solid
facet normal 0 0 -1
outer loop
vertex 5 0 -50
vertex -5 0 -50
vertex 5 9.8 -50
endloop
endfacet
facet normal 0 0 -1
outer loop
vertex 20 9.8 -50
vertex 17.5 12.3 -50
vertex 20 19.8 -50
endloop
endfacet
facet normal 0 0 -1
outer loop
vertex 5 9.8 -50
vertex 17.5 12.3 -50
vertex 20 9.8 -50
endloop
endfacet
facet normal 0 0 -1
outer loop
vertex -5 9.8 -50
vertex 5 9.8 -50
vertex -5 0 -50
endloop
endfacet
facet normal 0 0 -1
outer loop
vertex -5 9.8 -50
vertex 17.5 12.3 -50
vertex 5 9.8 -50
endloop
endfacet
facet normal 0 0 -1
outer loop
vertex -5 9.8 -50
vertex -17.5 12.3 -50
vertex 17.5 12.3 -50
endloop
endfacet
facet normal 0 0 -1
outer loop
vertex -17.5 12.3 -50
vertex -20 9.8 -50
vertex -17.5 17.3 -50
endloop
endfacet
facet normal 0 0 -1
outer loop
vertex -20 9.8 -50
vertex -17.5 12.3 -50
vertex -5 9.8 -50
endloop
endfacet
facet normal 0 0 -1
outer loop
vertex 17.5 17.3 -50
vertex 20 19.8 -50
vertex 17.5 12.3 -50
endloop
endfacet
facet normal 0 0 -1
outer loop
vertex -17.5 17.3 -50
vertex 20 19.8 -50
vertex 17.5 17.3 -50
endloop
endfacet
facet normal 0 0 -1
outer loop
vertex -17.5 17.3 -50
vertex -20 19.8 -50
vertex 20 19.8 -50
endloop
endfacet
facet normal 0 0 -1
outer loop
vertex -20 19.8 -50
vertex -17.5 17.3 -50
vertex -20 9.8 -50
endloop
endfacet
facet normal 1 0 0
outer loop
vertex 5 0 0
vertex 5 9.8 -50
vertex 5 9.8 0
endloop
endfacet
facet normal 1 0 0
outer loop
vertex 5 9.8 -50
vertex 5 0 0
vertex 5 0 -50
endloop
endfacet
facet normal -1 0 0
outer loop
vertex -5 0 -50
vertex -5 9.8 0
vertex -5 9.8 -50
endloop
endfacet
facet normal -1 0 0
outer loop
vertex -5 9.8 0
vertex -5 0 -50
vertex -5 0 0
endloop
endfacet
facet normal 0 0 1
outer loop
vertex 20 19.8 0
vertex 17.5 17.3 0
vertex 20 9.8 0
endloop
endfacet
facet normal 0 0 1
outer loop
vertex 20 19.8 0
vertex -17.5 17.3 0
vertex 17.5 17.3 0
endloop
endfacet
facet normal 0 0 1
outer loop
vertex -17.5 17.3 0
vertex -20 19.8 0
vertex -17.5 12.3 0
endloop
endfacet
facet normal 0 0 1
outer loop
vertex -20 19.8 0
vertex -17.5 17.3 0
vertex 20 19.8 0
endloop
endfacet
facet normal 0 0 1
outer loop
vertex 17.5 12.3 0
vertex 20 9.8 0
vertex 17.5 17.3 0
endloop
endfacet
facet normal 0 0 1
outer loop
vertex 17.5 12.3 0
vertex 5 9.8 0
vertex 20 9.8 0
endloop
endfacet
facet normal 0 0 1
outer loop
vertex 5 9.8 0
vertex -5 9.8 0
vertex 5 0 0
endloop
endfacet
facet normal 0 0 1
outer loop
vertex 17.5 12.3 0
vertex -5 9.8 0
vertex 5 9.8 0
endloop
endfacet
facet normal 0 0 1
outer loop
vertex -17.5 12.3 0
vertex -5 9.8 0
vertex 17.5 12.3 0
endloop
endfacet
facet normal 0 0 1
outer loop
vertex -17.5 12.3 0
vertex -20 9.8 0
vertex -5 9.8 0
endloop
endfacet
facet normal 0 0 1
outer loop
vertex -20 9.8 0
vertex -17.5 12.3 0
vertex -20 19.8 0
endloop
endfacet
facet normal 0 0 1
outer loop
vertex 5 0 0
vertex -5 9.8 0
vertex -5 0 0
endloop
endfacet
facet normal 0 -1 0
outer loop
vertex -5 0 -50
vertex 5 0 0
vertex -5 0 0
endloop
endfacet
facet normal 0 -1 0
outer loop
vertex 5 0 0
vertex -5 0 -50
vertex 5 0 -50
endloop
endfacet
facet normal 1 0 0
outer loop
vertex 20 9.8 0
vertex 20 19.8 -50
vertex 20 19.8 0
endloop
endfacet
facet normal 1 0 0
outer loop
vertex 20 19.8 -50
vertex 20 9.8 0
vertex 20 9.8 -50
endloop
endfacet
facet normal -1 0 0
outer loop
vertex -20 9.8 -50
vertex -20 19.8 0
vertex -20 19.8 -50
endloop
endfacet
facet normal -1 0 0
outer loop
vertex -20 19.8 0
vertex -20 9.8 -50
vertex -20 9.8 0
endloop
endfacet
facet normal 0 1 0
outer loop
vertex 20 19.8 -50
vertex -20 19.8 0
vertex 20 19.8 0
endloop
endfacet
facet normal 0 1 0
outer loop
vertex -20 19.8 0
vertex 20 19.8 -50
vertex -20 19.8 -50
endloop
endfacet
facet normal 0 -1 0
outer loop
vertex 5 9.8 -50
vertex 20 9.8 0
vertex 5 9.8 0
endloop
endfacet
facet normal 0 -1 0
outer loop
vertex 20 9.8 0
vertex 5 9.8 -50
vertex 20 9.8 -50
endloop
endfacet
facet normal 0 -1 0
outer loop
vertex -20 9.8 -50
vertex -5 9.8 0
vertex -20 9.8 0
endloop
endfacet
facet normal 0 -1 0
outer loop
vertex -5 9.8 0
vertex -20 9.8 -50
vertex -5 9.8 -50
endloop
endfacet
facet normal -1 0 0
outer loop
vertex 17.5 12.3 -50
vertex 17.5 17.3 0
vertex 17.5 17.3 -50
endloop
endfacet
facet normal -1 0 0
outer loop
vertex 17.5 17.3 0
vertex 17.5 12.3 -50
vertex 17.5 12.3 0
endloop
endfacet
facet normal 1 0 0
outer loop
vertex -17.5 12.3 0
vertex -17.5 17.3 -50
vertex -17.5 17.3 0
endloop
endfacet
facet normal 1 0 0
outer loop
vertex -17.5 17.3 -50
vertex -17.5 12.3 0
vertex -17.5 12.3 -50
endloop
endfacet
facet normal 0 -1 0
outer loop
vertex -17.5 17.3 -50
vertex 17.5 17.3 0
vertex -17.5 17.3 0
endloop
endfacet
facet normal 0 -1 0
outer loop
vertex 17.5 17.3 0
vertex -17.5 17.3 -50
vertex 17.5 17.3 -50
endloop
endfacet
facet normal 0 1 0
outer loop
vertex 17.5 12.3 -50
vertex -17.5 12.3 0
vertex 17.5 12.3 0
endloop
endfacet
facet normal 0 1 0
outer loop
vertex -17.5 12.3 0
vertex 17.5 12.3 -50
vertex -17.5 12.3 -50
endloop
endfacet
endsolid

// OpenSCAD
/*[Blade generator for sandpaper handler]*/

// Length of the blade:
BladeLength = 10;
// Radius for cylindrical blade (minimum 8):
BladeRadius = 16;
// Height for Ortho blade (minimum 10):
BladeHeight = 40;
// Hollow:
Hollow = 1; // [0:Fill, 1:Hollow]

// End type:
EndType=5; // [1:Round, 2:Chamfer, 3:Flat, 4:Cylindrical, 5:Ortho]

module MakeBlade()
{
    if (EndType==1)
        rotate([90,0,0])
        union()
        {
        cube([10,50,BladeLength]);
        translate([5,0,BladeLength])
            rotate([-90,0,0])
                cylinder(h=50,r=5,$fn=100);
        }
        
    if (EndType==2)
        rotate([0,90,180])
        difference()
        {
        cube([10,50,BladeLength]);
        translate([-10,-5,BladeLength-6])
            rotate([0,45,0])
                cube([10,60,20]);
        }

    if (EndType==3)
        cube([50,BladeLength,10]);

    if (EndType==4)
        rotate([0,90,0])
        difference()
        {
            union()
            {
            translate([0,0,-5])
                cube([50,12,10]);
            translate([0,BladeRadius+9,0])
                rotate([0,90,0])
                cylinder(h=50,r=BladeRadius,$fn=100);
                
            }
        if(Hollow>0)
        translate([-5,BladeRadius+9,0])
            rotate([0,90,0])
            cylinder(h=60,r=BladeRadius-4,$fn=100);
            
        }

    if (EndType==5)
        rotate([0,90,0])
        difference()
        {
            union()
            {
            translate([0,0,-5])
                cube([50,10,10]);
            translate([0,9.8,-BladeHeight/2])
                cube([50,BladeLength,BladeHeight]);
            }
        if(Hollow>0)
            translate([-5,9.8+(BladeLength-(BladeLength-5))/2,-(BladeHeight-5)/2])
                cube([60,BladeLength-5,BladeHeight-5]);
        }
}

// Main
MakeBlade();
